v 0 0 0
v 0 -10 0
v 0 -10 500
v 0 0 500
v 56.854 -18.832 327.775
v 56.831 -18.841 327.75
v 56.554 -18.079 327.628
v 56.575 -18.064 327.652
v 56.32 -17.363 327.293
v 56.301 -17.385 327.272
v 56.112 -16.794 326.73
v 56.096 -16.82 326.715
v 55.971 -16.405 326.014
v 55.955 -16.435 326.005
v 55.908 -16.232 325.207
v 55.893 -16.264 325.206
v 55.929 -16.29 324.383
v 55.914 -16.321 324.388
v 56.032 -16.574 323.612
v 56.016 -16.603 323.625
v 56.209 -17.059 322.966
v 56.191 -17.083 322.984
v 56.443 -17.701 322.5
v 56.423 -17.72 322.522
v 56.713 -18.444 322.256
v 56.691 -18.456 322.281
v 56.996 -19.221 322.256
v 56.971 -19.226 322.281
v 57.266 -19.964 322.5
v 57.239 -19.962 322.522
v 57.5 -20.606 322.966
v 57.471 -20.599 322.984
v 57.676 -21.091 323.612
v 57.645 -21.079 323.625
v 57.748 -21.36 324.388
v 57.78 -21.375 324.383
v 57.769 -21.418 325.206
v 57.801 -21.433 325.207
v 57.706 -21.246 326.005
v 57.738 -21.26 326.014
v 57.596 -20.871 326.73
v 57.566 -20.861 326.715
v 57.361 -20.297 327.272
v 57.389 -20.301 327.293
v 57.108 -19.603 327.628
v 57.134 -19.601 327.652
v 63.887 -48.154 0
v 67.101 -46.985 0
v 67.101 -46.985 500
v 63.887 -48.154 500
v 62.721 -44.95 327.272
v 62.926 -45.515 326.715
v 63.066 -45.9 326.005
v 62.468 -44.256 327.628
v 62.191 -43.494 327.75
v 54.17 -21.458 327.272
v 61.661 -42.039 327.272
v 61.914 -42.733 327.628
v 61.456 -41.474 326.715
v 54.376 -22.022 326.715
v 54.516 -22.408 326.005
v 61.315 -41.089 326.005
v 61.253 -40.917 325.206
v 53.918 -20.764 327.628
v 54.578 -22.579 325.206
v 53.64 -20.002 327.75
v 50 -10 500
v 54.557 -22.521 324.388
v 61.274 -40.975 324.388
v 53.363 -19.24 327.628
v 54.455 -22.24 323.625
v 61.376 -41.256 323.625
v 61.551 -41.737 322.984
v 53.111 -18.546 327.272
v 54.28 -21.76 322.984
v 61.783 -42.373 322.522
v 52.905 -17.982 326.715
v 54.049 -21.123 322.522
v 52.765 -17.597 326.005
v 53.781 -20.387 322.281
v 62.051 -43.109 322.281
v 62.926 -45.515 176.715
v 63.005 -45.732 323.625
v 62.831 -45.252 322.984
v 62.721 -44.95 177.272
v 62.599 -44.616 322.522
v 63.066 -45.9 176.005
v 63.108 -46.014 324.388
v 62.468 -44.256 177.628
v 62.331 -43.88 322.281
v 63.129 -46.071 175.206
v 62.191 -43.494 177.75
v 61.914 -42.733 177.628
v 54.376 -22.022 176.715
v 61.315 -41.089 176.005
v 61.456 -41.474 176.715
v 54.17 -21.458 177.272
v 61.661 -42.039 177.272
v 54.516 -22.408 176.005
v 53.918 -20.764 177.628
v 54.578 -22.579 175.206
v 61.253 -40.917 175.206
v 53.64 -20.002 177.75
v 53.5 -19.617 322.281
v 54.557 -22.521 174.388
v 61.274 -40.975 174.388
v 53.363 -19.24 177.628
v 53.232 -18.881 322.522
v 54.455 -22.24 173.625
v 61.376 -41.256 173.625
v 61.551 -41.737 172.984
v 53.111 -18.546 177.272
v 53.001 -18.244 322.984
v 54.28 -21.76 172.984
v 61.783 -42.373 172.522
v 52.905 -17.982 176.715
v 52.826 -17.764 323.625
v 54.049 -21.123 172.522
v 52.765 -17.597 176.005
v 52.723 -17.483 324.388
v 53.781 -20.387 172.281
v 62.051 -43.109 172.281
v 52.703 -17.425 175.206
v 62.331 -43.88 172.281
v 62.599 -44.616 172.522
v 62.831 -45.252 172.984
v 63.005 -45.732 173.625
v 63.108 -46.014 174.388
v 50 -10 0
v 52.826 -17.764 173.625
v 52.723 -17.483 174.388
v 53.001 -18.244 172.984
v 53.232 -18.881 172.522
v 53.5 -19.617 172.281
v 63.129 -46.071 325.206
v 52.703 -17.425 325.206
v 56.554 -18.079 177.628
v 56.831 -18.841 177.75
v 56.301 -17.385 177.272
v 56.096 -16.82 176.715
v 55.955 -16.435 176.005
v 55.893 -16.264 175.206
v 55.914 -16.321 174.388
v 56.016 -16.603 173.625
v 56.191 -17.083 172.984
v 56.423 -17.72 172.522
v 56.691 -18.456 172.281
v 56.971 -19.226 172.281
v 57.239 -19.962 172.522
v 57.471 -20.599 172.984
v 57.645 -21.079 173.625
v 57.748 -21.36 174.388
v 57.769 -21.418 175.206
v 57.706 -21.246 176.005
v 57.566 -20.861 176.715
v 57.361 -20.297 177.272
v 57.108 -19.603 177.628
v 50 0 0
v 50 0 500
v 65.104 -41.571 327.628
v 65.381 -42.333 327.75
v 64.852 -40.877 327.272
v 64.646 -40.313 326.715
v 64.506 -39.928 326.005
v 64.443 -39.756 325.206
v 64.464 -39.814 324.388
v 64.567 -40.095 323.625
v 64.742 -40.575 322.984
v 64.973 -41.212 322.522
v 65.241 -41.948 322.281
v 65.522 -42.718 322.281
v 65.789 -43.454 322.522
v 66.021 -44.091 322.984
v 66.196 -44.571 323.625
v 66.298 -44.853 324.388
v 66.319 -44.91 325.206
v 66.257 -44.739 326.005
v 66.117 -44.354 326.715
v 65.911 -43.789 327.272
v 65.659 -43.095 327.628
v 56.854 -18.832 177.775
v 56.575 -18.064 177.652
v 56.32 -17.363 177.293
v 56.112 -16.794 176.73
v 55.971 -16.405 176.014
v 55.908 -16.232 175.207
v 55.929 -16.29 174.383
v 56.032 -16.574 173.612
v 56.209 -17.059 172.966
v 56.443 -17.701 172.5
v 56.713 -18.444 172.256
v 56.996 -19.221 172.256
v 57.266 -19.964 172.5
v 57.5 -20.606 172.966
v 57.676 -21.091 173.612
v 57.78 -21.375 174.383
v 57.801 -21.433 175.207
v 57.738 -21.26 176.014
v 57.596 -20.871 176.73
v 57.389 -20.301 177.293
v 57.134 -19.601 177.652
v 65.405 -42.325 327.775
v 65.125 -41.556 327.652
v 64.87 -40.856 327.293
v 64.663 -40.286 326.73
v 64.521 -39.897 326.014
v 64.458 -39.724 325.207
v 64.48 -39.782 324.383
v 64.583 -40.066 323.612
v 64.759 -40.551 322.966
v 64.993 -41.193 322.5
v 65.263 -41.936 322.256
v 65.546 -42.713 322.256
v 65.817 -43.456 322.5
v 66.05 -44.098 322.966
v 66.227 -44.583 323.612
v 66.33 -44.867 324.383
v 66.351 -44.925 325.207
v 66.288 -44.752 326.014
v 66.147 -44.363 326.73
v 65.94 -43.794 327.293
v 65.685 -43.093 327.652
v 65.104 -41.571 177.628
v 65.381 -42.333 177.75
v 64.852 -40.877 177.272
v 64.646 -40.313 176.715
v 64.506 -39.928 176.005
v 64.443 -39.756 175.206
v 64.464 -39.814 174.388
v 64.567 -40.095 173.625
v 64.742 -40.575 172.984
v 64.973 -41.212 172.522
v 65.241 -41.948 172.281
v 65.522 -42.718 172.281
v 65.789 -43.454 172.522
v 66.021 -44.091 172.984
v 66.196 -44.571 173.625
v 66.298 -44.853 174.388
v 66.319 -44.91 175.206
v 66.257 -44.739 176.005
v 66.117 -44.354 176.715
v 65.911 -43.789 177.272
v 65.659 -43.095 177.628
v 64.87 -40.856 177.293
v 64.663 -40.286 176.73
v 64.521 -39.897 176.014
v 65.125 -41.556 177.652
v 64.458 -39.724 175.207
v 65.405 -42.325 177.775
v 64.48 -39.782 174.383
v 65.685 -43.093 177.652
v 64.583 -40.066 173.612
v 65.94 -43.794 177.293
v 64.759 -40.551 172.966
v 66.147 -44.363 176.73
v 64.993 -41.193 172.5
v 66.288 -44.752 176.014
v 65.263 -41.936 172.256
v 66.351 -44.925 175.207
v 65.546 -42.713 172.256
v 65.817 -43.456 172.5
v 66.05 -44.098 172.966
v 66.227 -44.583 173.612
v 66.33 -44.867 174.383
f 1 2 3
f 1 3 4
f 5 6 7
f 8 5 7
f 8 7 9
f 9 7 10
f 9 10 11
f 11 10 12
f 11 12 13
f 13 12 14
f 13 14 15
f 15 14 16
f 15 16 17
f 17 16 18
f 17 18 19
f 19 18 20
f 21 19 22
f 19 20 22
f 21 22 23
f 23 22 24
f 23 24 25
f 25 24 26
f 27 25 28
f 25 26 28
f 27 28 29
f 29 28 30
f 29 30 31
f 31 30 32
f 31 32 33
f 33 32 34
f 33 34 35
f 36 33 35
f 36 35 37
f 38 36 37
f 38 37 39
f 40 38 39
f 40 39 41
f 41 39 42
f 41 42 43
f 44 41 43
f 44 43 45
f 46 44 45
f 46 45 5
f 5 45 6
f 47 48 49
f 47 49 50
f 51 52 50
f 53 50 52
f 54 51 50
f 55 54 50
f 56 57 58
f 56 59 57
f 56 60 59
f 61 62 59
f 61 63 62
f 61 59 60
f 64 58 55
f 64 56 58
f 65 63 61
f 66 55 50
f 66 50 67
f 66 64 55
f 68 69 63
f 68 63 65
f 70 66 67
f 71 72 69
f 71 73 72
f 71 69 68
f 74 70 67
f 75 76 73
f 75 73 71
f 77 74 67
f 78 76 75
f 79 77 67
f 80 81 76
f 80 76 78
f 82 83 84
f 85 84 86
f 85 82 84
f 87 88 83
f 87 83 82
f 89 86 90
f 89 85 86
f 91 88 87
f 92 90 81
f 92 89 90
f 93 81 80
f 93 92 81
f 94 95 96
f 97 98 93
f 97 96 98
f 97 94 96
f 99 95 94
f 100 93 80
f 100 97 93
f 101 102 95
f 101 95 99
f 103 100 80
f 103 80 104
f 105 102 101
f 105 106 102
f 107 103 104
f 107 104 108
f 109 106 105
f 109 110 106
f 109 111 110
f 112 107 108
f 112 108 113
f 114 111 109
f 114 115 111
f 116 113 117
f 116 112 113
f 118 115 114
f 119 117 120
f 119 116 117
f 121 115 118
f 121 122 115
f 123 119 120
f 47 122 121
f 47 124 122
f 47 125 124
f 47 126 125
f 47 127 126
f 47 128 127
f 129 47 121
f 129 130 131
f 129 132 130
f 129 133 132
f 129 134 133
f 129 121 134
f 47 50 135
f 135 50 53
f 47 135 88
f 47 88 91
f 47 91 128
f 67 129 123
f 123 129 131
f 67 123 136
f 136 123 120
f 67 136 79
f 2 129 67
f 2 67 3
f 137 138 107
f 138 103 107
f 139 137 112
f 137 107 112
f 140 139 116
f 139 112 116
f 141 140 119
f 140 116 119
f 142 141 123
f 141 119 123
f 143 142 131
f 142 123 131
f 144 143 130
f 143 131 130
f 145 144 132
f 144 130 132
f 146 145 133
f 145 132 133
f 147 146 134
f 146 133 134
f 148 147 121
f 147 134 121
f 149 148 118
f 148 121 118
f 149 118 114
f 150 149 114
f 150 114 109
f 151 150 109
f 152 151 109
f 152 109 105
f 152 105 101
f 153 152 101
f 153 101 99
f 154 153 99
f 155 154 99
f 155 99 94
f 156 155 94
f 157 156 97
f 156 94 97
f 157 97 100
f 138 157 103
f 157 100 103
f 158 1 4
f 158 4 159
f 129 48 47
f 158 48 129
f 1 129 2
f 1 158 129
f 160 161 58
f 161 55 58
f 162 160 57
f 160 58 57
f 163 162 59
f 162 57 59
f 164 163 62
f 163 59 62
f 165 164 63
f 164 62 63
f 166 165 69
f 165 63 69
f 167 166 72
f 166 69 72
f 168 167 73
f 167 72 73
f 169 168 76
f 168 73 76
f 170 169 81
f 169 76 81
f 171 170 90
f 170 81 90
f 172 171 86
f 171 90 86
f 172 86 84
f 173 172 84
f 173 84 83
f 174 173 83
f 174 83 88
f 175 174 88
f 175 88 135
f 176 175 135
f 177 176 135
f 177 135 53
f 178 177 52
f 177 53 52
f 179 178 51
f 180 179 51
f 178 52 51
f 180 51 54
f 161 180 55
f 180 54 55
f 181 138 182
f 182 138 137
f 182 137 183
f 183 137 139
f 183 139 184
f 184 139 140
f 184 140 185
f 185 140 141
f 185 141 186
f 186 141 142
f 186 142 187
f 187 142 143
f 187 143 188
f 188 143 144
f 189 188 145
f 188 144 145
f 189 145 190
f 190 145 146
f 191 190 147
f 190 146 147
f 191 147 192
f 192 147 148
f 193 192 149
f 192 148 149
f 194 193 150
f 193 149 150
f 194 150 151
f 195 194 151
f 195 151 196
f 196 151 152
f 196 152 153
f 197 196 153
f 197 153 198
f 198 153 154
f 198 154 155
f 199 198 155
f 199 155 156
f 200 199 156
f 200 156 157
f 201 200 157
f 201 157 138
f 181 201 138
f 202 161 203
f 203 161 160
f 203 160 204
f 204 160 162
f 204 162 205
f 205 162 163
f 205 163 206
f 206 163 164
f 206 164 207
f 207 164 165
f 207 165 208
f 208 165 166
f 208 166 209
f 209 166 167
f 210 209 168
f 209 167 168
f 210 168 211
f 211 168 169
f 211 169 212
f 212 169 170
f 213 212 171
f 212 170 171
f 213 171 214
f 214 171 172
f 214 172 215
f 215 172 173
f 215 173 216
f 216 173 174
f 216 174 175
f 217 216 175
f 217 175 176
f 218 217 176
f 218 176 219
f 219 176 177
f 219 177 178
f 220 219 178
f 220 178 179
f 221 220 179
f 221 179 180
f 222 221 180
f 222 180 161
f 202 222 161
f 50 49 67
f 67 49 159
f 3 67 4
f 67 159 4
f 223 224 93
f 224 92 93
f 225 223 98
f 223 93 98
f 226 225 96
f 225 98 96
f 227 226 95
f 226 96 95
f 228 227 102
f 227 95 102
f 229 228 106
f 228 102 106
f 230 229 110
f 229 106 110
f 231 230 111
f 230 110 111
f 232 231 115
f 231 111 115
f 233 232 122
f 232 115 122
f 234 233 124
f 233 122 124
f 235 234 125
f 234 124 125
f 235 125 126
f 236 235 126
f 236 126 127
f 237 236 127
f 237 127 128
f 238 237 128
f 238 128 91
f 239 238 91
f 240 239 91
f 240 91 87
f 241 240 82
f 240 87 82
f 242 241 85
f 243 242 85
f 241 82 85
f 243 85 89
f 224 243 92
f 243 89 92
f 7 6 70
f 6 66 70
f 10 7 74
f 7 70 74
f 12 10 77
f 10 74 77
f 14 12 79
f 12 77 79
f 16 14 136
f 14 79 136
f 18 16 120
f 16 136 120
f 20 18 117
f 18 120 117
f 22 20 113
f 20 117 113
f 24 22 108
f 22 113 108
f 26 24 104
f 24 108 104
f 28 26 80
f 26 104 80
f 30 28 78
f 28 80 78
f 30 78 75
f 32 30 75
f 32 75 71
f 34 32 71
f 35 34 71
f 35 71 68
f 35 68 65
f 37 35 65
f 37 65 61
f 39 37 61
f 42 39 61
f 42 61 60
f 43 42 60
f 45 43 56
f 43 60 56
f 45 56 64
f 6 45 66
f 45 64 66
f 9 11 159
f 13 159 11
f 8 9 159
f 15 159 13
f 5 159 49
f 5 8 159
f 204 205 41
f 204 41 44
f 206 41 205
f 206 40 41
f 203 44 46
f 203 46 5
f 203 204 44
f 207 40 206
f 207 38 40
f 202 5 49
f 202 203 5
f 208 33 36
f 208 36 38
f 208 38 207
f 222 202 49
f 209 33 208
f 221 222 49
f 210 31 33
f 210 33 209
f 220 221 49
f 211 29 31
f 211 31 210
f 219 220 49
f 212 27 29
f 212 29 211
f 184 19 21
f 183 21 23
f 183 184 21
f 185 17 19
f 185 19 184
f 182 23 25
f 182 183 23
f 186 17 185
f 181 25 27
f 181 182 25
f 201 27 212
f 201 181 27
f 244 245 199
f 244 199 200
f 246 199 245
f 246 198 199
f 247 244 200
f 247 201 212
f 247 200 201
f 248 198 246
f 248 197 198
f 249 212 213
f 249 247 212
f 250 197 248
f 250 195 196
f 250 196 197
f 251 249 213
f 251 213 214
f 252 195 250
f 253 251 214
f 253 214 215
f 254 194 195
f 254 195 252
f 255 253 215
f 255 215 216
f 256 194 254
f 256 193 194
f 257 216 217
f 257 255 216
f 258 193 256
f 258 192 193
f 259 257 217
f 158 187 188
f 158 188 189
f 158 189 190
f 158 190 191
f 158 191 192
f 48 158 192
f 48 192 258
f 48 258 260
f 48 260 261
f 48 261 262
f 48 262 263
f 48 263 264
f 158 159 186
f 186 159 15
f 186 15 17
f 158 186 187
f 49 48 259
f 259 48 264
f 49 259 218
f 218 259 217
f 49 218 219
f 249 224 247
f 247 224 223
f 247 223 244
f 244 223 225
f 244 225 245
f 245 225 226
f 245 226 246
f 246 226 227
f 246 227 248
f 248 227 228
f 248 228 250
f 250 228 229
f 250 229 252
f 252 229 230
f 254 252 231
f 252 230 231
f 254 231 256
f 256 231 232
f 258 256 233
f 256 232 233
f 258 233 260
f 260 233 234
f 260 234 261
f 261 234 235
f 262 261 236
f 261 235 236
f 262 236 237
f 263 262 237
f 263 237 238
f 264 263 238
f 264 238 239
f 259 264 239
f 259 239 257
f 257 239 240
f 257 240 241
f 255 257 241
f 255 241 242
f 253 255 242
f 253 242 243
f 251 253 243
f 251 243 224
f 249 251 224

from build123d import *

# Parameters (mm, degrees)
BOSS_EXTRUDE6_DEPTH            = 500
M5_CLEARANCE_HOLE1_D           = 5.5
M5_CLEARANCE_HOLE1_CSINK_D     = 5.55
M5_CLEARANCE_HOLE1_CSINK_ANGLE = 90


with BuildPart() as part:
    # Sketch4 → Boss-Extrude6 (new body)
    with BuildSketch(Plane.XY):
        Polygon((0, 0), (50, 0), (67.101007166, -46.984631039), (63.887069118, -48.154408824), (50, -10), (0, -10), align=None)
    extrude(amount=BOSS_EXTRUDE6_DEPTH)

    # M5 Clearance Hole1 (through all)
    with Locations(Plane(origin=(44.151111078, 16.069690242, 0), x_dir=(0, 0, -1), z_dir=(0.939692621, 0.342020143, 0))):
        with Locations((-325, -37.141900038), (-325, -62.141900038), (-175, -62.141900038), (-175, -37.141900038)):
            CounterSinkHole(M5_CLEARANCE_HOLE1_D / 2, M5_CLEARANCE_HOLE1_CSINK_D / 2, counter_sink_angle=M5_CLEARANCE_HOLE1_CSINK_ANGLE)


solid = part.part
